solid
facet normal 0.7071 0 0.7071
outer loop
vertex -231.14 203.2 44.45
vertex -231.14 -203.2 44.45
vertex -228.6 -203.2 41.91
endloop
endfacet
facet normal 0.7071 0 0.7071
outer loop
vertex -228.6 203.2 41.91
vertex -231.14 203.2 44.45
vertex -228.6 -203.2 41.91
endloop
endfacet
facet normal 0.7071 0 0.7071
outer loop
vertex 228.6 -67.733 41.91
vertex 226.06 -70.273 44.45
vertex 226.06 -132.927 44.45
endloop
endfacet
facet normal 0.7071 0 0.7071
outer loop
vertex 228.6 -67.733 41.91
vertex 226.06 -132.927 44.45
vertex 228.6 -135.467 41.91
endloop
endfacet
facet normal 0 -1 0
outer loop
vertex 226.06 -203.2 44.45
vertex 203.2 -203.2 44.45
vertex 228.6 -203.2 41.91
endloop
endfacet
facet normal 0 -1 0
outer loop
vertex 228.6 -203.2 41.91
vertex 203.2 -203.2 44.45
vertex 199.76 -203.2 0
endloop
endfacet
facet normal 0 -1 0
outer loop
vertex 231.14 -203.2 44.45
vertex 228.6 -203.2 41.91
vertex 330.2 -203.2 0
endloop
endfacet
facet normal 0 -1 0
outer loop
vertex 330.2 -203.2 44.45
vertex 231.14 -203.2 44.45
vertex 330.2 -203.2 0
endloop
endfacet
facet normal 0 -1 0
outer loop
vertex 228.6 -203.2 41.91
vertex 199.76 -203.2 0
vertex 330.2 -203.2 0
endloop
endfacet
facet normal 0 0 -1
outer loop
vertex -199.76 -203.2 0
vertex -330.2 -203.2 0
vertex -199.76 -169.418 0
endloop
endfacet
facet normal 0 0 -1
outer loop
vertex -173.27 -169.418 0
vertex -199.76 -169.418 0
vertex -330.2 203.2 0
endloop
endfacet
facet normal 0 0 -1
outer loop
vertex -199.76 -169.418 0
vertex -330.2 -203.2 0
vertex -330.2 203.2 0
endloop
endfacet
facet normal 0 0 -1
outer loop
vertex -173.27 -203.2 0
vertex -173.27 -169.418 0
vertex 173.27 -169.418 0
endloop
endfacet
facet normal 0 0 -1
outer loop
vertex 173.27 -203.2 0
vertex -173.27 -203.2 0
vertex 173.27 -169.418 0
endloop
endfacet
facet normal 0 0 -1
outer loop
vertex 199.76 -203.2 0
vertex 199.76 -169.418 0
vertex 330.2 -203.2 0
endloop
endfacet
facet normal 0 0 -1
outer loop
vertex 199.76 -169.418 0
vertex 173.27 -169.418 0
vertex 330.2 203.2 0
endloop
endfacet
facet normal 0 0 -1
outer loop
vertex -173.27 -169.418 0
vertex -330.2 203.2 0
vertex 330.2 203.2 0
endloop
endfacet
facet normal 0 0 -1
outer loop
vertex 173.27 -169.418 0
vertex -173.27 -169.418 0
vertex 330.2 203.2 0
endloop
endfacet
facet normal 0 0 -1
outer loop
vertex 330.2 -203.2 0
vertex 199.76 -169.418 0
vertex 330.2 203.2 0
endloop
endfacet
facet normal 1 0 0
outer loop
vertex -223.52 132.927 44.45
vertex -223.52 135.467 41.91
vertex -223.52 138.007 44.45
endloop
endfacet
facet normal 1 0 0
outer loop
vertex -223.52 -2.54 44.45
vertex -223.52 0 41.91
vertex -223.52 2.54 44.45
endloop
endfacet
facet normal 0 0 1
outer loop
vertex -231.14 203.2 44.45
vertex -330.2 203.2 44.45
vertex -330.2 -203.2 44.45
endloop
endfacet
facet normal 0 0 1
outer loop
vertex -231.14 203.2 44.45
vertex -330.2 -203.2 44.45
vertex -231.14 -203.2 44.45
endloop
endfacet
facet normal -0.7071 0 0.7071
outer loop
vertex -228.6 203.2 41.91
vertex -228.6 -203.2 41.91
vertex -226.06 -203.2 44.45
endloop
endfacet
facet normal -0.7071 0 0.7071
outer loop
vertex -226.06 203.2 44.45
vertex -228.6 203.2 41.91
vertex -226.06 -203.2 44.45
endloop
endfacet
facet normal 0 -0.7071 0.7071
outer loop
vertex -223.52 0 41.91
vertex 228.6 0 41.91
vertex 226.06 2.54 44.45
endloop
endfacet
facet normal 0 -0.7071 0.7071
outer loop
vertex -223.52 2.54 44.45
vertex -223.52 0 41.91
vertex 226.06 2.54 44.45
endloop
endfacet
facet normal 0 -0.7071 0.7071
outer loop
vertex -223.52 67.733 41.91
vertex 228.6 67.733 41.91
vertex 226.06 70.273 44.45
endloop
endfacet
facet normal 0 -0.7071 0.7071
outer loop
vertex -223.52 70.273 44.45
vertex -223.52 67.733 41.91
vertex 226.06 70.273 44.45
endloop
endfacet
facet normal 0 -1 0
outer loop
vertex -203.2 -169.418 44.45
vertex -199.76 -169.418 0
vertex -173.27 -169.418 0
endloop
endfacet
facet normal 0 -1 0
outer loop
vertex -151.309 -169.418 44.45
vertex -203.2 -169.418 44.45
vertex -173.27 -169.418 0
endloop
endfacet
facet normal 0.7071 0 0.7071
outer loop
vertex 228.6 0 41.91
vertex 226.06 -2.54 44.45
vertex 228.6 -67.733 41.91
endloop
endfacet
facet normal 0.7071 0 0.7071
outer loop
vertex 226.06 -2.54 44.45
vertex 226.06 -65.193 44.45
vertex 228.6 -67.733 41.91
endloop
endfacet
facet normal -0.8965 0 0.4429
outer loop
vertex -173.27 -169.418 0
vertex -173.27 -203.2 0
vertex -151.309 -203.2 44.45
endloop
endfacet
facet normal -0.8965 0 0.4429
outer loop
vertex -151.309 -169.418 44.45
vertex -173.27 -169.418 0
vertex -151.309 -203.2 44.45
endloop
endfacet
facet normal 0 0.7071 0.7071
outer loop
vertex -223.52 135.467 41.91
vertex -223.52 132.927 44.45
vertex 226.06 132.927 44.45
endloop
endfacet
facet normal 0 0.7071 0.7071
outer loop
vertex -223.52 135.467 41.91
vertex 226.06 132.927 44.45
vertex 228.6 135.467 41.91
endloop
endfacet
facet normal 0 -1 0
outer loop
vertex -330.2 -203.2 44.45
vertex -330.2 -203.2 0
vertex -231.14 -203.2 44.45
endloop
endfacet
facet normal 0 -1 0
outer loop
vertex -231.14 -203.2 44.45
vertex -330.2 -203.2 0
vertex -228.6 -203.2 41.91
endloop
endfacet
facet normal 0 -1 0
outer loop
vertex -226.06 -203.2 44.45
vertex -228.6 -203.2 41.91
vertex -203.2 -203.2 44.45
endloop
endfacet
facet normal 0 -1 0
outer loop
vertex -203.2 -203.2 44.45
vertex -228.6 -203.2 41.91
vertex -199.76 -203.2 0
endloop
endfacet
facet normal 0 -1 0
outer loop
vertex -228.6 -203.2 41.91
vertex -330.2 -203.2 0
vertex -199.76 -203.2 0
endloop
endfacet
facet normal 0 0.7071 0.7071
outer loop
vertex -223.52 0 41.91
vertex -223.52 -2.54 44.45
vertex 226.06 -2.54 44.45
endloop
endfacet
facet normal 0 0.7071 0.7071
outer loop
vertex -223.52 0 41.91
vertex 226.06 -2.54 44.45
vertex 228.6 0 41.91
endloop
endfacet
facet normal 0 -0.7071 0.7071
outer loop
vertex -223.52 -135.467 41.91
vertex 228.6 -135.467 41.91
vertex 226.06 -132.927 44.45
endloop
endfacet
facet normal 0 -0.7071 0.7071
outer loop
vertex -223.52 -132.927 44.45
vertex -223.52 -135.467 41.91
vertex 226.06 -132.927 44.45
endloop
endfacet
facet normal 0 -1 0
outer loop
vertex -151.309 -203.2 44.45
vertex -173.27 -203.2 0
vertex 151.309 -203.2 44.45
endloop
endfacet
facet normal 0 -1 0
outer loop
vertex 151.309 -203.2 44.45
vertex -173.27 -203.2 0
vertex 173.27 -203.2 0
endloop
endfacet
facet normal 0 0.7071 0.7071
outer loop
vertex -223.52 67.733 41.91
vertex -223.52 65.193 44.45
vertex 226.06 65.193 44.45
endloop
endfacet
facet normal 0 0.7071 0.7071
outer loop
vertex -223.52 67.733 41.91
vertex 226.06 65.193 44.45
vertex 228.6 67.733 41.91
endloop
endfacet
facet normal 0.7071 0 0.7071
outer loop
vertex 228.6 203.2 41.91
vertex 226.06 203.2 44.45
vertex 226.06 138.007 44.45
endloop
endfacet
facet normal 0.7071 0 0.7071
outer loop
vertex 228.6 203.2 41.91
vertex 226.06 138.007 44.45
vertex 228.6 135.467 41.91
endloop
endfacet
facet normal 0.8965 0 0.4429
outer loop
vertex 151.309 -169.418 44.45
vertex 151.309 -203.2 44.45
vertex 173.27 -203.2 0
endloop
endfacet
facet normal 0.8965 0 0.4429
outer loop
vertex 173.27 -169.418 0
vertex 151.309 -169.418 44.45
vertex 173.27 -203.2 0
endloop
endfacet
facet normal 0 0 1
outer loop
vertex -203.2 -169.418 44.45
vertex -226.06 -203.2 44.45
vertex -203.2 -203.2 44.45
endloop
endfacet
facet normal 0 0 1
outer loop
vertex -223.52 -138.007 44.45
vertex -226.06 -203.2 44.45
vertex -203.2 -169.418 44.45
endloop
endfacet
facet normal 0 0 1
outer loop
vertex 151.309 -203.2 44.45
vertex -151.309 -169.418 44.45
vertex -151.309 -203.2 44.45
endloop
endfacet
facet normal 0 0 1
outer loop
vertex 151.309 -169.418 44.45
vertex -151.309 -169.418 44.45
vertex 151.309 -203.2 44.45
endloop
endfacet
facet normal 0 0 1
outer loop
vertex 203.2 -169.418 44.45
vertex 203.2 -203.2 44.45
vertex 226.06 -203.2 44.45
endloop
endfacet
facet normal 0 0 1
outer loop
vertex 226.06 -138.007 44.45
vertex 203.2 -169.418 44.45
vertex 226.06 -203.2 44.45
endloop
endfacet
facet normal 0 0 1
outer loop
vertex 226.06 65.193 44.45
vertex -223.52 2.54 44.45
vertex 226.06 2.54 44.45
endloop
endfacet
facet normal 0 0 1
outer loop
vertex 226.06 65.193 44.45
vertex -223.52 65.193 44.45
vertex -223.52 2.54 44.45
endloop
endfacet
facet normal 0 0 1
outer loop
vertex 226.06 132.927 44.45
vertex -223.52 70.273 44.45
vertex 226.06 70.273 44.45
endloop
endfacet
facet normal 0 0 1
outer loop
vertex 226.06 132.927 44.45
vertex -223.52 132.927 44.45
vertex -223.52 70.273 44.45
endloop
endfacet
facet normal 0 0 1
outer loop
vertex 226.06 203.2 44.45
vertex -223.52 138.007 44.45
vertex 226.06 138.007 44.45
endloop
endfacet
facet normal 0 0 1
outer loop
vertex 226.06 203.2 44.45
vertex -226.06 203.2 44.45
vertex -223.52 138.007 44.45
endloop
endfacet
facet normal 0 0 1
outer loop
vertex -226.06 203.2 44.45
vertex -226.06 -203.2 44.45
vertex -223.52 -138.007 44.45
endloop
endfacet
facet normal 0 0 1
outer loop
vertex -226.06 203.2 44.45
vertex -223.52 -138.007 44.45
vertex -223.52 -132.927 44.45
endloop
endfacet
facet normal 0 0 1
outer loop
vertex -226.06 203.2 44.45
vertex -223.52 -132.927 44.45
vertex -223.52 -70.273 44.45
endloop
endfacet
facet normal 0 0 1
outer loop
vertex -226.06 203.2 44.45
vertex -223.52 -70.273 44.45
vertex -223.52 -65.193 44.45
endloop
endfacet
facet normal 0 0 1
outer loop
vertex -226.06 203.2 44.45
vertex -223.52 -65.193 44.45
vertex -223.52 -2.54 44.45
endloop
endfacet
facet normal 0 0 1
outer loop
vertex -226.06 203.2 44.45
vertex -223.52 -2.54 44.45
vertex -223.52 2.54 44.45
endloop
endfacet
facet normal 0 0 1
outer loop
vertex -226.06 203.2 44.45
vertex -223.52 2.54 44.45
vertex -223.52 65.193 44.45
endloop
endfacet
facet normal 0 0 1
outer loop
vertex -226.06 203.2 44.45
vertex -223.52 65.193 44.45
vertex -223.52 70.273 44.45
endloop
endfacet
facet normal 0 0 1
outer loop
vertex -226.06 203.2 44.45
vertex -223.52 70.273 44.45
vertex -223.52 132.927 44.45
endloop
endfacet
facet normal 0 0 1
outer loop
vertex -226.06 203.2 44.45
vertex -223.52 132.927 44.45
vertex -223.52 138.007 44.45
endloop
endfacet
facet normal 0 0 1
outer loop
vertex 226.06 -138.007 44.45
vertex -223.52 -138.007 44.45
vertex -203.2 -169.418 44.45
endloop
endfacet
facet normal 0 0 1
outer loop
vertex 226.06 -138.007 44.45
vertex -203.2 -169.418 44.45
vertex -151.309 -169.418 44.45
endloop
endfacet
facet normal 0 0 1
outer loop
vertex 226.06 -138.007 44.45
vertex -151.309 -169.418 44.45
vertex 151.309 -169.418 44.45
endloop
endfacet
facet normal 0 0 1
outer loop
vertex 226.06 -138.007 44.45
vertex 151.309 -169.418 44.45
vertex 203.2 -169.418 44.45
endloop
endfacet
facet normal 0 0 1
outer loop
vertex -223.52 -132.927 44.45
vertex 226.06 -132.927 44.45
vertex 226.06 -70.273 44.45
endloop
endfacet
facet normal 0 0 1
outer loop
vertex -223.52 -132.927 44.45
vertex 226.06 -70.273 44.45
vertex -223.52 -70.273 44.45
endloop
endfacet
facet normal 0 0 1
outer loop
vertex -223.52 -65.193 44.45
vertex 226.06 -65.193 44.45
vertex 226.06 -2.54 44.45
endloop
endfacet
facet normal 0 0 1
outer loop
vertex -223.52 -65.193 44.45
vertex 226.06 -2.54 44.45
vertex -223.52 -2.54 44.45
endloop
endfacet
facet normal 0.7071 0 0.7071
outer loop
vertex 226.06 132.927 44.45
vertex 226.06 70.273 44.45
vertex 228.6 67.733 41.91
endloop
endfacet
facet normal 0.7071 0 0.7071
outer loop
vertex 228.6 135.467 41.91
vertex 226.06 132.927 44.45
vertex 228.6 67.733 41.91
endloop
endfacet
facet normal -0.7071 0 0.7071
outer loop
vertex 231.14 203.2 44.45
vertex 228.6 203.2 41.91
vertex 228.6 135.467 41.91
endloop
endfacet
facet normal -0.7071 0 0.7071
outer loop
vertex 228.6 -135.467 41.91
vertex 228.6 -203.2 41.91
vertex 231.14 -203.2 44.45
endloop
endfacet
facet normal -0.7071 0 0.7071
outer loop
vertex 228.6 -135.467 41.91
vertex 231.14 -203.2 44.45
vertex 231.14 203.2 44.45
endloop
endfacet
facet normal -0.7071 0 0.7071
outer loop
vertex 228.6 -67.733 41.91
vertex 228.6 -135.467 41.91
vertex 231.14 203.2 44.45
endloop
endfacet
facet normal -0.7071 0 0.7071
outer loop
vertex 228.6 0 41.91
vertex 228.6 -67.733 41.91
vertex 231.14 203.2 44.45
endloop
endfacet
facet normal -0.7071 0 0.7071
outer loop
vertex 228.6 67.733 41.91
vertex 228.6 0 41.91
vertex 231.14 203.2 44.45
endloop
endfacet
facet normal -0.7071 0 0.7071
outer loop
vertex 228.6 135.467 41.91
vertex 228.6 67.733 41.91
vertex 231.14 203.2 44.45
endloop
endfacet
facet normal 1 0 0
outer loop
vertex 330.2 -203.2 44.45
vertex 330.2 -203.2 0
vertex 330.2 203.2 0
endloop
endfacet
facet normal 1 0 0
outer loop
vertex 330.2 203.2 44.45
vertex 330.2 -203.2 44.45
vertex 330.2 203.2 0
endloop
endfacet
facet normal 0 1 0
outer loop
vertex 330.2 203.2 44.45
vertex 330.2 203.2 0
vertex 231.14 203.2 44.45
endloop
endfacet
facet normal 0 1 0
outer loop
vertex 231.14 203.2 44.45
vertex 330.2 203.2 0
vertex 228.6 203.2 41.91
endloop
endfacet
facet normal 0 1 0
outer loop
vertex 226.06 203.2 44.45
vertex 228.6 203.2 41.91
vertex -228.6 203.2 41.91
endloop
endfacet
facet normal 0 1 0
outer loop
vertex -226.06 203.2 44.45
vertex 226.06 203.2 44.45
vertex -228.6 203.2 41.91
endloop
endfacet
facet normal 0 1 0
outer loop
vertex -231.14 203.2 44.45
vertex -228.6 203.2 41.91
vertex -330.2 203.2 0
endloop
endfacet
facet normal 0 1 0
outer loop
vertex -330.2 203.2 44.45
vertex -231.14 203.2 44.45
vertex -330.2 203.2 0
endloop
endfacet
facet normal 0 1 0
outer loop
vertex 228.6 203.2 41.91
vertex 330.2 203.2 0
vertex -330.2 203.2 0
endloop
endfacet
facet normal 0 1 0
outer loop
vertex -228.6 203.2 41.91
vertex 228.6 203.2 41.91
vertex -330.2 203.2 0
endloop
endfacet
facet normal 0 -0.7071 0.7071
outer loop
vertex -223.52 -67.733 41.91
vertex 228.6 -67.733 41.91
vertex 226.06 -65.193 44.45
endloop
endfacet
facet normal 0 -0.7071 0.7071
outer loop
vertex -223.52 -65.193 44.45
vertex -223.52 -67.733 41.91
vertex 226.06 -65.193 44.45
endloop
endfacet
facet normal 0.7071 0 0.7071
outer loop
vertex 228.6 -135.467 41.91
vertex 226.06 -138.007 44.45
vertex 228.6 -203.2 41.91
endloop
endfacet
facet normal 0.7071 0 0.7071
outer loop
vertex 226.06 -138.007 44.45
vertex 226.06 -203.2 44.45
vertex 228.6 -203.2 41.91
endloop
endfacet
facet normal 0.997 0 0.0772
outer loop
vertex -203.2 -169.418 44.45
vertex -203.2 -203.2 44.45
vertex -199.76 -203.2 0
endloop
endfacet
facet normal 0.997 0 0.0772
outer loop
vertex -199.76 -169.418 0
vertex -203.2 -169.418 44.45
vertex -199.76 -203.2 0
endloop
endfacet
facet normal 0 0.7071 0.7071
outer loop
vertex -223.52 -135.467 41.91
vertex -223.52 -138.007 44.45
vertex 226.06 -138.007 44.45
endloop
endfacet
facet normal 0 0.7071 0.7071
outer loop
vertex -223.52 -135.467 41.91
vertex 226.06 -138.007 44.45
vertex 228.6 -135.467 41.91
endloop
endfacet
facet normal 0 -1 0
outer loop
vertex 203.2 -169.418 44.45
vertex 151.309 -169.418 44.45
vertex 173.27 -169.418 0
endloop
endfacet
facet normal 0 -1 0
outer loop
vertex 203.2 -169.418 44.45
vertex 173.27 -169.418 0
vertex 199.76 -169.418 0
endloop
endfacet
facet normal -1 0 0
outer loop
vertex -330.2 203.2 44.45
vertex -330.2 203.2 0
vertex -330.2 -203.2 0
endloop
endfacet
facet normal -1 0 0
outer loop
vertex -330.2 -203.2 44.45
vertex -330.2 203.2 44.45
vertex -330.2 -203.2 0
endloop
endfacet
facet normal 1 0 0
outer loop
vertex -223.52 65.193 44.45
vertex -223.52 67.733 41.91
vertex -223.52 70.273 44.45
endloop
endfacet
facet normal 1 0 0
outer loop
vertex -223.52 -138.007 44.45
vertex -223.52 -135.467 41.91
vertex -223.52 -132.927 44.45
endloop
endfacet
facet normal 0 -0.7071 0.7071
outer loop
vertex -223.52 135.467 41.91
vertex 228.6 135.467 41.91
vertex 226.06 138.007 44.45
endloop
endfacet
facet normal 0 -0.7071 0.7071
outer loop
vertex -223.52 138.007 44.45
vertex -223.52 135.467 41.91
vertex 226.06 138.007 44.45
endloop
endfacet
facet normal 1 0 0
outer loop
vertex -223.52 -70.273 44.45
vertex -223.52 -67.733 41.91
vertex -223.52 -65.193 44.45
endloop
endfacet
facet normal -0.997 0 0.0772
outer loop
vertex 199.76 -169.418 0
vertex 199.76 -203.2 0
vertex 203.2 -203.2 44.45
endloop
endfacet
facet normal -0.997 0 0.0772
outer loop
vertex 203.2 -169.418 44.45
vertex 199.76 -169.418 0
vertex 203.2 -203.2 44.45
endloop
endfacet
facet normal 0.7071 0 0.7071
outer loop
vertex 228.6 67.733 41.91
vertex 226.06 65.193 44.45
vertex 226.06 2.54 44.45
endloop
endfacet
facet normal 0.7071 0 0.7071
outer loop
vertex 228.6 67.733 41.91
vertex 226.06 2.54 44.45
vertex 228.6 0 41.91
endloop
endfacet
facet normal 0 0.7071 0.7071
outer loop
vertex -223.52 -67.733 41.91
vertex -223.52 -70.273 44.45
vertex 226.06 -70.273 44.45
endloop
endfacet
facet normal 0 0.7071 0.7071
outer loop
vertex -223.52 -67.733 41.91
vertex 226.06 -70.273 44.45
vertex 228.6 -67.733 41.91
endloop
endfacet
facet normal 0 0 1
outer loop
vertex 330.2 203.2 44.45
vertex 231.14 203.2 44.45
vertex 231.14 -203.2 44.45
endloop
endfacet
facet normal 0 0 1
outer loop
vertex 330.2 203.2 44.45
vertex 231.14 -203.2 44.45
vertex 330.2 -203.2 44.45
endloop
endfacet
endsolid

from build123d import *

# Parameters (mm, degrees)
F0_W      = 457.2
F0_H      = 67.7333333333
F1_DEPTH  = 44.45
F10_DEPTH = 33.782


with BuildPart() as f1:
    # F0 (on Top) → F1 (new body)
    with BuildSketch(Plane.XY):
        Polygon((-228.6, 203.2), (-330.2, 203.2), (-330.2, -203.2), (-228.6, -203.2), (-228.6, -135.4666666667), (-228.6, -67.7333333333), (-228.6, 0), (-228.6, 67.7333333333), (-228.6, 135.4666666667), align=None)
        with Locations((0, -169.3333333333)):
            Rectangle(F0_W, F0_H)
        with Locations((0, -101.6)):
            Rectangle(F0_W, F0_H)
        with Locations((0, -33.8666666667)):
            Rectangle(F0_W, F0_H)
        with Locations((0, 33.8666666667)):
            Rectangle(F0_W, F0_H)
        with Locations((0, 101.6)):
            Rectangle(F0_W, F0_H)
        with Locations((0, 169.3333333333)):
            Rectangle(F0_W, F0_H)
        Polygon((330.2, 203.2), (228.6, 203.2), (228.6, 135.4666666667), (228.6, 67.7333333333), (228.6, 0), (228.6, -67.7333333333), (228.6, -135.4666666667), (228.6, -203.2), (330.2, -203.2), align=None)
    extrude(amount=F1_DEPTH)

    # F4: sweep along a path in F2
    with BuildLine(Plane.XY.offset(44.45)) as f4_path:
        Line((-228.6, 203.2), (-228.6, -203.2))
    # F3 (on face) → F4 (sweep, cut)
    with BuildSketch(Plane.XZ.offset(203.2)):
        Polygon((-226.06, 44.45), (-228.6, 44.45), (-231.14, 44.45), (-228.6, 41.91), align=None)
        Polygon((228.6, 44.45), (226.06, 44.45), (228.6, 41.91), (231.14, 44.45), align=None)
    sweep(path=f4_path.line, mode=Mode.SUBTRACT)

    # F8: sweep along a path in F6
    with BuildLine(Plane.XY.offset(44.45)) as f8_path:
        Line((-226.06, -67.7333333333), (226.06, -67.7333333333))
    # F7 (on offset) → F8 (sweep, cut)
    with BuildSketch(Plane.YZ.offset(228.6)):
        Polygon((-132.9266666667, 44.45), (-135.4666666667, 44.45), (-138.0066666667, 44.45), (-135.4666666667, 41.91), align=None)
        Polygon((-67.7333333333, 44.45), (-70.2733333333, 44.45), (-67.7333333333, 41.91), (-65.1933333333, 44.45), align=None)
        Polygon((0, 44.45), (-2.54, 44.45), (0, 41.91), (2.54, 44.45), align=None)
        Polygon((67.7333333333, 44.45), (65.1933333333, 44.45), (67.7333333333, 41.91), (70.2733333333, 44.45), align=None)
        Polygon((135.4666666667, 44.45), (132.9266666667, 44.45), (135.4666666667, 41.91), (138.0066666667, 44.45), align=None)
    sweep(path=f8_path.line, mode=Mode.SUBTRACT)

    # F9 (on face) → F10 (cut)
    with BuildSketch(Plane.XZ.offset(203.2)):
        Polygon((-173.269695488, 0), (-151.3092788213, 44.45), (-203.2, 44.45), (-199.7604166667, 0), align=None)
        Polygon((203.2, 44.45), (151.3092788213, 44.45), (173.269695488, 0), (199.7604166667, 0), align=None)
    extrude(amount=-F10_DEPTH, mode=Mode.SUBTRACT)


solid = f1.part
